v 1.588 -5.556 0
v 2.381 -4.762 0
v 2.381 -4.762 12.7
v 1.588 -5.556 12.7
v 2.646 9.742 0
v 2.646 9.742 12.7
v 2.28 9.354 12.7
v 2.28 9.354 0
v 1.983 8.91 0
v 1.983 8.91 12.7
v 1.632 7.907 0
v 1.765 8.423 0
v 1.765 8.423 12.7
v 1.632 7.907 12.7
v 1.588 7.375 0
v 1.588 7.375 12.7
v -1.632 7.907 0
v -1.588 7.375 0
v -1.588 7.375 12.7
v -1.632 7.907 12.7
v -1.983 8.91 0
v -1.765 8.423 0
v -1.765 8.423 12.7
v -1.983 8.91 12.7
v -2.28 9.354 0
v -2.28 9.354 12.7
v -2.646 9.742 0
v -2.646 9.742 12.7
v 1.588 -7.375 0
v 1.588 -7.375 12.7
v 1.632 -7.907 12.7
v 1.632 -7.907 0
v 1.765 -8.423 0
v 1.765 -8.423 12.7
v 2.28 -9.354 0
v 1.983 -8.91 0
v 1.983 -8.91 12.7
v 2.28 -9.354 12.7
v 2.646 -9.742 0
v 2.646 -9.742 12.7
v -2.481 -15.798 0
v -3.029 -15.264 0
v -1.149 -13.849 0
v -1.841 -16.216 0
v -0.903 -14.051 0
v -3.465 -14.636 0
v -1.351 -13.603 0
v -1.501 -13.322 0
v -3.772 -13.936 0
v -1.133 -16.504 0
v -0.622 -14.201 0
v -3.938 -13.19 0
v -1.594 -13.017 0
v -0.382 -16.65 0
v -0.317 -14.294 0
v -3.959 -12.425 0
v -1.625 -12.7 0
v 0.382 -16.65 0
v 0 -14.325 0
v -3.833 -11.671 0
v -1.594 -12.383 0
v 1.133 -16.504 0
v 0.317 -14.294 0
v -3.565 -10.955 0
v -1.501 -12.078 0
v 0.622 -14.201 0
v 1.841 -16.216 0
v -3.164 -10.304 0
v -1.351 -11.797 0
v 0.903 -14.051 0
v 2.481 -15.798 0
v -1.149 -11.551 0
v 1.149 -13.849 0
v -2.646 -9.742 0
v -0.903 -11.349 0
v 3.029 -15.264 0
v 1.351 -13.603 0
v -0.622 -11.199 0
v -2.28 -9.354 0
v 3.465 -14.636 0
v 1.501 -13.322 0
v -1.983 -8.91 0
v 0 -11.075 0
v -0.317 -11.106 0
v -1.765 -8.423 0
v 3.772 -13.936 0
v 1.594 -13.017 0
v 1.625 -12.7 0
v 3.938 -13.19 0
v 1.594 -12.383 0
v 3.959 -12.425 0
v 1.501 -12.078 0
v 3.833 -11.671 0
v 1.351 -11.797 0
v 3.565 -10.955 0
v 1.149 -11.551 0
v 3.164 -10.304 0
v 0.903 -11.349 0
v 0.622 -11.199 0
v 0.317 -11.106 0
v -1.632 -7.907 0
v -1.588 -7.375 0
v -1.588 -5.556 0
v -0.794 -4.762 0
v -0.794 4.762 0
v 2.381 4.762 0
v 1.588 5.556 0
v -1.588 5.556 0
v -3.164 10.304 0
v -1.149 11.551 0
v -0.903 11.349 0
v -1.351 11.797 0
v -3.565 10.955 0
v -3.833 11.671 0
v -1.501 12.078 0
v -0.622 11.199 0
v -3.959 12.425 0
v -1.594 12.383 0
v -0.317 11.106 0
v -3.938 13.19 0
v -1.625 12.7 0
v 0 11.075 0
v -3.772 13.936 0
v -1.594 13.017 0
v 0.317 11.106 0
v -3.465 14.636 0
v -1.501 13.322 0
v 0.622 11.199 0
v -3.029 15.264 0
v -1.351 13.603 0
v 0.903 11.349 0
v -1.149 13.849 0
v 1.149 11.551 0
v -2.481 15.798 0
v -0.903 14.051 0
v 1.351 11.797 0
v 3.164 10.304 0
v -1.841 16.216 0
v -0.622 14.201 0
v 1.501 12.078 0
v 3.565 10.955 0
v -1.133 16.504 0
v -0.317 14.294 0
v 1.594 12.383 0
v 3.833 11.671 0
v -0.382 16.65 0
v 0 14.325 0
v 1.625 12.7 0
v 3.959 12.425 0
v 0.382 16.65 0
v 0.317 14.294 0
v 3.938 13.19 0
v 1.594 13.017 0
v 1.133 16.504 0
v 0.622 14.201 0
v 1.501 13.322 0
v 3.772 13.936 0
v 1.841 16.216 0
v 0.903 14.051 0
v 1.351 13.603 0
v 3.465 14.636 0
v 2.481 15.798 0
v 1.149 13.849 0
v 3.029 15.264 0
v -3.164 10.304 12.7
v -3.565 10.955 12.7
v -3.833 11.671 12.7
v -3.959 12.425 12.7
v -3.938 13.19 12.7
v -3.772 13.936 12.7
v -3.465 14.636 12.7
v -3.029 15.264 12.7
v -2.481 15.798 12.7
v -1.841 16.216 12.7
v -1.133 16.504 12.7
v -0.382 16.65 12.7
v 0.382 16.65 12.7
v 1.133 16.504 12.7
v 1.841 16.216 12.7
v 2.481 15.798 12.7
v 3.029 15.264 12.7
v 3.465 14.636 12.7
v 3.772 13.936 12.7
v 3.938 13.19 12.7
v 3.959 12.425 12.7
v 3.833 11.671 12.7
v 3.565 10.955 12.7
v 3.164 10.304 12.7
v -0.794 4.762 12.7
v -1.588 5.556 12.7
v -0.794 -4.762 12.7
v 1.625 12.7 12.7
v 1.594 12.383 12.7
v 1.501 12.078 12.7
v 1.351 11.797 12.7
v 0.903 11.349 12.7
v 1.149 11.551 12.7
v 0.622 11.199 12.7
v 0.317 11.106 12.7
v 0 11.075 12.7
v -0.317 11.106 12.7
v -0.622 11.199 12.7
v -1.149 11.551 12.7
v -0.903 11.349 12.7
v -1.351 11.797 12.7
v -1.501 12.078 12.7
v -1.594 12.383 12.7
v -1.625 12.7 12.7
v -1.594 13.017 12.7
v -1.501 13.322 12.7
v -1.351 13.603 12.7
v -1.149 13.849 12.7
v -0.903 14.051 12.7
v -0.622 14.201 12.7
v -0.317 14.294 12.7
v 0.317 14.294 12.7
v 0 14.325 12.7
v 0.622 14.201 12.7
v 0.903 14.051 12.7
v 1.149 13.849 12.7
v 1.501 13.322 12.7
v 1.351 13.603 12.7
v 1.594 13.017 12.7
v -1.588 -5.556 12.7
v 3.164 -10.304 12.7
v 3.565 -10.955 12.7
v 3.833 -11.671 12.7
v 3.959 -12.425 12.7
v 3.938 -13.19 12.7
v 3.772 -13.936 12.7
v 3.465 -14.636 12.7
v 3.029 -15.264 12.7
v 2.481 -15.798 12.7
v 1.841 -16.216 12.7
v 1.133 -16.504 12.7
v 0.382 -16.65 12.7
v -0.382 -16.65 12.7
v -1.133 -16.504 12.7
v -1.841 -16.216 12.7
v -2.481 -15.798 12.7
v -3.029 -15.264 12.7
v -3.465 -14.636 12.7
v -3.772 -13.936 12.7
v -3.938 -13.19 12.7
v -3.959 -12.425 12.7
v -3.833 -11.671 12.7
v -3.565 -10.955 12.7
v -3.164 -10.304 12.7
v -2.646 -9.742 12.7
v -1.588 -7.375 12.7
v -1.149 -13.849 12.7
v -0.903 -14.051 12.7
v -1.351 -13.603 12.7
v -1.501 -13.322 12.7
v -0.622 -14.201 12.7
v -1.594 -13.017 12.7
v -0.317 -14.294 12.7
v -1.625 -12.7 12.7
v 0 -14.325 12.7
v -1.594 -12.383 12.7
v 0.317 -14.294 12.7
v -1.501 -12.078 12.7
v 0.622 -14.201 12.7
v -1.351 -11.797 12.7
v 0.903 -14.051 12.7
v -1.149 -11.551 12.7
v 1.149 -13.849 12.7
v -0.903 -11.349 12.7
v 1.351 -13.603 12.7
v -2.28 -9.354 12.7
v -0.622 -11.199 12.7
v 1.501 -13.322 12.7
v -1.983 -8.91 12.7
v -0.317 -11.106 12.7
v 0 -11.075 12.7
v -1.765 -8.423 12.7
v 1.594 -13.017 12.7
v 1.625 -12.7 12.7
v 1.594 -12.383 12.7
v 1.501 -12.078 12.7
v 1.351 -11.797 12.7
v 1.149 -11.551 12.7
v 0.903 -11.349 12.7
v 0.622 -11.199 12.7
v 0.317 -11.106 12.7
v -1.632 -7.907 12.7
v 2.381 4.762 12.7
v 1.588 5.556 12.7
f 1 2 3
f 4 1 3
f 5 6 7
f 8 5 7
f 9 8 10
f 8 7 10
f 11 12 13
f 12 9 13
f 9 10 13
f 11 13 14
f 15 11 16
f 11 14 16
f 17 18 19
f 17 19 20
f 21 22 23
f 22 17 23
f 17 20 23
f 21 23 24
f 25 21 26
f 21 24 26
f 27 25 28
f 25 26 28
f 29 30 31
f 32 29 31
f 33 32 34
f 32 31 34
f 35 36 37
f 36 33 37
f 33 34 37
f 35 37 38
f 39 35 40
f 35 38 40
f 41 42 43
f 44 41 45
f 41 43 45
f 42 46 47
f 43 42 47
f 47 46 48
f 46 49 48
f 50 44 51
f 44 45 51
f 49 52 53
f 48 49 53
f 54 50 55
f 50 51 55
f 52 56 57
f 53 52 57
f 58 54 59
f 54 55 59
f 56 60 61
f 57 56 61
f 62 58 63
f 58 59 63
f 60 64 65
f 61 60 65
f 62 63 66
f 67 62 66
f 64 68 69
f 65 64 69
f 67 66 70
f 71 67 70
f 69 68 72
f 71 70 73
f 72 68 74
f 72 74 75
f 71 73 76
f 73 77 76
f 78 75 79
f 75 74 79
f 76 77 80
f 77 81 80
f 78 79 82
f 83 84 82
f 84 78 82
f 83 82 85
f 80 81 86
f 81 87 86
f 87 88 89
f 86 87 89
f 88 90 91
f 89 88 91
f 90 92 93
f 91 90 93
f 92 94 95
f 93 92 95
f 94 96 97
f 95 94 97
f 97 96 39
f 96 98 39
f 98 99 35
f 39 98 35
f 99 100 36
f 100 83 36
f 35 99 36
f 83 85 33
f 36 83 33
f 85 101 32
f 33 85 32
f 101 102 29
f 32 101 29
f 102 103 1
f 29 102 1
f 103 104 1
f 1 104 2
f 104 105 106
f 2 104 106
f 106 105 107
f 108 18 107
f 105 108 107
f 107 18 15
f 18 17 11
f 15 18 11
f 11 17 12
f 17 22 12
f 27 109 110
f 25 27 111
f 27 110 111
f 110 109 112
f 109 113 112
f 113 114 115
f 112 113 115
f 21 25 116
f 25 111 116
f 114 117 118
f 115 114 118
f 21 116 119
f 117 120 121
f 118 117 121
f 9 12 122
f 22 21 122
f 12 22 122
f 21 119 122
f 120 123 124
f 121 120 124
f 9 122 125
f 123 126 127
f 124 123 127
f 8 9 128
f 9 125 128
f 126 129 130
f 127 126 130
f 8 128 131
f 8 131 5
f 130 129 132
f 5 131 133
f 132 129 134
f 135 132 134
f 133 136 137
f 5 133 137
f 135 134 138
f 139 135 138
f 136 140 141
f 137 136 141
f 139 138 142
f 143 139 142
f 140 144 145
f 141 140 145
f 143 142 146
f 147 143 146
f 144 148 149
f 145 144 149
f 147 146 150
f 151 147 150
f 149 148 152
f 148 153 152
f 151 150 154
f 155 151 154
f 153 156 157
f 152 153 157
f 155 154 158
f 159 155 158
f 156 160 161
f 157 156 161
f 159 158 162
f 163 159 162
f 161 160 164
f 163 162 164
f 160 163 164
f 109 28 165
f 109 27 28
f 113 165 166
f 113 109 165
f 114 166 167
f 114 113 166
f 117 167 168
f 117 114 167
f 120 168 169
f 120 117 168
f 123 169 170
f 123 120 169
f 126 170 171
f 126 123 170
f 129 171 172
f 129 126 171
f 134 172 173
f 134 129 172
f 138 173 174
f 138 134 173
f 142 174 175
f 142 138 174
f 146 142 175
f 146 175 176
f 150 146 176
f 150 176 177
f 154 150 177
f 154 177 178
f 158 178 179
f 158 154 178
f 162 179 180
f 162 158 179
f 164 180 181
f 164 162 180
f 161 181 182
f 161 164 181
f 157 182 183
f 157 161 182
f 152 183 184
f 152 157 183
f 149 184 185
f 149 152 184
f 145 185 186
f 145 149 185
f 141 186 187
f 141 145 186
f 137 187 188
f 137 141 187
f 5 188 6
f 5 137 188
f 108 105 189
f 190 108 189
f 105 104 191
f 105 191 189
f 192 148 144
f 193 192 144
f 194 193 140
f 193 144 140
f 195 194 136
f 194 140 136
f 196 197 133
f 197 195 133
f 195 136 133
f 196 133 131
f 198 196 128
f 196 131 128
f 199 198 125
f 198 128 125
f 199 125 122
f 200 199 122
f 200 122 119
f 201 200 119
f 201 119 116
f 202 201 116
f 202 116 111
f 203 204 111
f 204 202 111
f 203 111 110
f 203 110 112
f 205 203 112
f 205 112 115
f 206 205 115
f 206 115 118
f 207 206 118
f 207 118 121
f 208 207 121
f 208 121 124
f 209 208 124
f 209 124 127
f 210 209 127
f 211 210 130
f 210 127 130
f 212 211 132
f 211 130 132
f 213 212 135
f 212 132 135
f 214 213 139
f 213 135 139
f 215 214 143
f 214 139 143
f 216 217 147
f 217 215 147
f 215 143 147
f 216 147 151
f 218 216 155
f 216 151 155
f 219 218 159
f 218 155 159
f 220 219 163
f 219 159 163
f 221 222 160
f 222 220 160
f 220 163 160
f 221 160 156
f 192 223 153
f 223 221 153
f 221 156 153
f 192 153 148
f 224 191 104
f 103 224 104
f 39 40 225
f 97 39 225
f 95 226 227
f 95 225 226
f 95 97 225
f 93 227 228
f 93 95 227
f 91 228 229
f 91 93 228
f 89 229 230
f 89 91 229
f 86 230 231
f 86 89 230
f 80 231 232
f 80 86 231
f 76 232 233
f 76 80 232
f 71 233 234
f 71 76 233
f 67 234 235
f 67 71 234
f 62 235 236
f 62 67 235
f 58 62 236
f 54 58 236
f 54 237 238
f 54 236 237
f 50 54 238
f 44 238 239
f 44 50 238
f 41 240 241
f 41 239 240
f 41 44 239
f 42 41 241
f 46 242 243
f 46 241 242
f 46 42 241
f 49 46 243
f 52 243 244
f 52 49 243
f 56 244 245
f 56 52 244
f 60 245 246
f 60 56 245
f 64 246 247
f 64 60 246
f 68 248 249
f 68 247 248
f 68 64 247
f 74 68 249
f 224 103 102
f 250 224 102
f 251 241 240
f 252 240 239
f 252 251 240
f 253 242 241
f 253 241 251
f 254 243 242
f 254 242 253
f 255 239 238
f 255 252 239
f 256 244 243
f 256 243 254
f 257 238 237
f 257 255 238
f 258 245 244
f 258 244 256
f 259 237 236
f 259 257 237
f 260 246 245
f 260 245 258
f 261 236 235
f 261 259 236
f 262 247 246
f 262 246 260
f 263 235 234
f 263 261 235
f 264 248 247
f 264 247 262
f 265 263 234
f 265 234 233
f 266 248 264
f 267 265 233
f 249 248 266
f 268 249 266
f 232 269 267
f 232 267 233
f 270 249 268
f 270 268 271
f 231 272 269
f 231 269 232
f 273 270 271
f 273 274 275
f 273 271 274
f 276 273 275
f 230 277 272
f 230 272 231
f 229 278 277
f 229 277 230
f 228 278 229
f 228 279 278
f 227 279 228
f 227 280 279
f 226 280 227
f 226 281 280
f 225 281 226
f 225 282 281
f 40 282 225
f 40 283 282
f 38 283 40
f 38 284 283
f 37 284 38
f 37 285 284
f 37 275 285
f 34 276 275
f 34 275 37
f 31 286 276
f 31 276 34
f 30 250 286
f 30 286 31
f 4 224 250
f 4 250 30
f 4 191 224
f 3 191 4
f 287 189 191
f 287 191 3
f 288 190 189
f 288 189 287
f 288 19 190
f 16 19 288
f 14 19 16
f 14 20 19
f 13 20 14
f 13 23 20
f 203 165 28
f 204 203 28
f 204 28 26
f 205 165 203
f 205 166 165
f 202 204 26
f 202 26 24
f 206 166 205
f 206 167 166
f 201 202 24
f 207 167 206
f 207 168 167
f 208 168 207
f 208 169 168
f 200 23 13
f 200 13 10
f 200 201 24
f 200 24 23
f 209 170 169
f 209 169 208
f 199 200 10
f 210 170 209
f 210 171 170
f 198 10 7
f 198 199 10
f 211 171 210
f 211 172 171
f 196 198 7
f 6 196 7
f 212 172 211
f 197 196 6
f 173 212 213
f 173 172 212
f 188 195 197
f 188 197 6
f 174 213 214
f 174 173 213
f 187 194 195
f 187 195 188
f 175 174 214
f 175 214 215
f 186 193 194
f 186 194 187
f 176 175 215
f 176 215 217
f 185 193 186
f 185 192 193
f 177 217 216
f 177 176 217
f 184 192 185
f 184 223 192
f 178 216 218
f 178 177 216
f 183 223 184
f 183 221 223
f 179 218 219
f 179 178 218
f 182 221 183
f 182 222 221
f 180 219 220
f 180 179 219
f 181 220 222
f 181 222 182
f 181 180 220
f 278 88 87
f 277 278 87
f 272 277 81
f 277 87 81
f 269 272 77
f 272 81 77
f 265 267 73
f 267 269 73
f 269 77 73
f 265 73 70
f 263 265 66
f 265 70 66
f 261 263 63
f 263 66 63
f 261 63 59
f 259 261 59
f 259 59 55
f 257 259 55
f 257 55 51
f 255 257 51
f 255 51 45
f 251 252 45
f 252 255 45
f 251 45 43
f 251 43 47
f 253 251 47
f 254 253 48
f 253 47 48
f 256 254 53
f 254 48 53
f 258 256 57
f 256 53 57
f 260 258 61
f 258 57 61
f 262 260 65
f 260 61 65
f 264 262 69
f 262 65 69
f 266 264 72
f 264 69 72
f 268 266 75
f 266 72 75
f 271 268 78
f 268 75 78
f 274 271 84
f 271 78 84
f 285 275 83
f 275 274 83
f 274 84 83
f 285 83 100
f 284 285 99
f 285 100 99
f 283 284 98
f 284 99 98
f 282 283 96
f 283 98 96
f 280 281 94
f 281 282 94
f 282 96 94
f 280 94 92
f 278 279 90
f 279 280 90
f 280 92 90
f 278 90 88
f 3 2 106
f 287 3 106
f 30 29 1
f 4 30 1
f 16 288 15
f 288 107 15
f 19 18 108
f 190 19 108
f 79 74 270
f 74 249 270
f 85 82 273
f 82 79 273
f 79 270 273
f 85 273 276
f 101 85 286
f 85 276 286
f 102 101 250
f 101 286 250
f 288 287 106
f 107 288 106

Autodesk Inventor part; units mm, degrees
ref_plane "YZ Plane" through (0, 0, 0) normal (1, 0, 0) x (0, 1, 0)
ref_plane "XZ Plane" through (0, 0, 0) normal (0, 1, 0) x (-1, 0, 0)
ref_plane "XY Plane" through (0, 0, 0) normal (0, 0, 1) x (1, 0, 0)
sketch "Sketch1" plane through (0, 0, 0) normal (0, 0, 1) x (1, 0, 0)
  line L0 (0, 0) -> (0, 12.7) construction
  circle A0 centre (0, 12.7) radius 1.625
  circle A1 centre (0, 12.7) radius 3.9688
  line L1 (-1.5875, -9.0626) -> (1.5875, -9.0626) construction
  line L2 (1.5875, -9.0626) -> (1.5875, 9.0626)
  line L3 (1.5875, 9.0626) -> (-1.5875, 9.0626) construction
  line L4 (-1.5875, 9.0626) -> (-1.5875, -9.0626)
  line L5 (-1.5875, -9.0626) -> (1.5875, 9.0626) construction
  line L6 (1.5875, -9.0626) -> (-1.5875, 9.0626) construction
  circle A2 centre (0, -12.7) radius 1.625
  circle A3 centre (0, -12.7) radius 3.9688
  line L7 (-1.5875, -9.0626) -> (1.5875, -9.0626) construction
  line L8 (-2.3813, -4.7625) -> (-0.7937, -4.7625)
  line L9 (-0.7937, -4.7625) -> (-0.7937, 4.7625)
  line L10 (-0.7937, 4.7625) -> (-2.3813, 4.7625)
  line L11 (-2.3813, 4.7625) -> (-2.3813, -4.7625) construction
  line L12 (-2.3813, -4.7625) -> (-0.7937, 4.7625) construction
  line L13 (-0.7937, -4.7625) -> (-2.3813, 4.7625) construction
  line L14 (0.7937, -4.7625) -> (2.3813, -4.7625)
  line L15 (2.3813, -4.7625) -> (2.3813, 4.7625)
  line L16 (2.3813, 4.7625) -> (0.7937, 4.7625)
  line L17 (0.7937, 4.7625) -> (0.7937, -4.7625) construction
  line L18 (0.7937, -4.7625) -> (2.3813, 4.7625) construction
  line L19 (2.3813, -4.7625) -> (0.7937, 4.7625) construction
  point P0 (-1.5875, 0)
  point P1 (1.5875, 0)
  point P2 (-1.5875, 4.7625)
  point P3 (-1.5875, -4.7625)
  point P4 (1.5875, -4.7625)
  point P5 (1.5875, 4.7625)
  dimension "d2" = 7.9375
  dimension "d0" = 12.7
  dimension "d1" = 3.25
  dimension "d3" = 3.175
  dimension "d6" = 360
  dimension "d8" = 1.5875
  dimension "d9" = 9.525
  dimension "d10" = 1.5875
  dimension "d11" = 9.525
extrude "Extrusion1" add sketch "Sketch1" along normal blind 12.7 contours A1 | A1 L2 A3 L4 L8 L9 L10 | L16 L15 L14 L2 | A3
chamfer "Chamfer1" distance 0.7937 angle 45 4 edges at (-1.5875, 4.7625, 6.35) (1.5875, 4.7625, 6.35) (1.5875, -4.7625, 6.35) (-1.5875, -4.7625, 6.35)
fillet "Fillet1" radius 3.175 4 edges at (1.5875, 9.0626, 6.35) (-1.5875, 9.0626, 6.35) (1.5875, -9.0626, 6.35) (-1.5875, -9.0626, 6.35)
properties part number "Hinge"
